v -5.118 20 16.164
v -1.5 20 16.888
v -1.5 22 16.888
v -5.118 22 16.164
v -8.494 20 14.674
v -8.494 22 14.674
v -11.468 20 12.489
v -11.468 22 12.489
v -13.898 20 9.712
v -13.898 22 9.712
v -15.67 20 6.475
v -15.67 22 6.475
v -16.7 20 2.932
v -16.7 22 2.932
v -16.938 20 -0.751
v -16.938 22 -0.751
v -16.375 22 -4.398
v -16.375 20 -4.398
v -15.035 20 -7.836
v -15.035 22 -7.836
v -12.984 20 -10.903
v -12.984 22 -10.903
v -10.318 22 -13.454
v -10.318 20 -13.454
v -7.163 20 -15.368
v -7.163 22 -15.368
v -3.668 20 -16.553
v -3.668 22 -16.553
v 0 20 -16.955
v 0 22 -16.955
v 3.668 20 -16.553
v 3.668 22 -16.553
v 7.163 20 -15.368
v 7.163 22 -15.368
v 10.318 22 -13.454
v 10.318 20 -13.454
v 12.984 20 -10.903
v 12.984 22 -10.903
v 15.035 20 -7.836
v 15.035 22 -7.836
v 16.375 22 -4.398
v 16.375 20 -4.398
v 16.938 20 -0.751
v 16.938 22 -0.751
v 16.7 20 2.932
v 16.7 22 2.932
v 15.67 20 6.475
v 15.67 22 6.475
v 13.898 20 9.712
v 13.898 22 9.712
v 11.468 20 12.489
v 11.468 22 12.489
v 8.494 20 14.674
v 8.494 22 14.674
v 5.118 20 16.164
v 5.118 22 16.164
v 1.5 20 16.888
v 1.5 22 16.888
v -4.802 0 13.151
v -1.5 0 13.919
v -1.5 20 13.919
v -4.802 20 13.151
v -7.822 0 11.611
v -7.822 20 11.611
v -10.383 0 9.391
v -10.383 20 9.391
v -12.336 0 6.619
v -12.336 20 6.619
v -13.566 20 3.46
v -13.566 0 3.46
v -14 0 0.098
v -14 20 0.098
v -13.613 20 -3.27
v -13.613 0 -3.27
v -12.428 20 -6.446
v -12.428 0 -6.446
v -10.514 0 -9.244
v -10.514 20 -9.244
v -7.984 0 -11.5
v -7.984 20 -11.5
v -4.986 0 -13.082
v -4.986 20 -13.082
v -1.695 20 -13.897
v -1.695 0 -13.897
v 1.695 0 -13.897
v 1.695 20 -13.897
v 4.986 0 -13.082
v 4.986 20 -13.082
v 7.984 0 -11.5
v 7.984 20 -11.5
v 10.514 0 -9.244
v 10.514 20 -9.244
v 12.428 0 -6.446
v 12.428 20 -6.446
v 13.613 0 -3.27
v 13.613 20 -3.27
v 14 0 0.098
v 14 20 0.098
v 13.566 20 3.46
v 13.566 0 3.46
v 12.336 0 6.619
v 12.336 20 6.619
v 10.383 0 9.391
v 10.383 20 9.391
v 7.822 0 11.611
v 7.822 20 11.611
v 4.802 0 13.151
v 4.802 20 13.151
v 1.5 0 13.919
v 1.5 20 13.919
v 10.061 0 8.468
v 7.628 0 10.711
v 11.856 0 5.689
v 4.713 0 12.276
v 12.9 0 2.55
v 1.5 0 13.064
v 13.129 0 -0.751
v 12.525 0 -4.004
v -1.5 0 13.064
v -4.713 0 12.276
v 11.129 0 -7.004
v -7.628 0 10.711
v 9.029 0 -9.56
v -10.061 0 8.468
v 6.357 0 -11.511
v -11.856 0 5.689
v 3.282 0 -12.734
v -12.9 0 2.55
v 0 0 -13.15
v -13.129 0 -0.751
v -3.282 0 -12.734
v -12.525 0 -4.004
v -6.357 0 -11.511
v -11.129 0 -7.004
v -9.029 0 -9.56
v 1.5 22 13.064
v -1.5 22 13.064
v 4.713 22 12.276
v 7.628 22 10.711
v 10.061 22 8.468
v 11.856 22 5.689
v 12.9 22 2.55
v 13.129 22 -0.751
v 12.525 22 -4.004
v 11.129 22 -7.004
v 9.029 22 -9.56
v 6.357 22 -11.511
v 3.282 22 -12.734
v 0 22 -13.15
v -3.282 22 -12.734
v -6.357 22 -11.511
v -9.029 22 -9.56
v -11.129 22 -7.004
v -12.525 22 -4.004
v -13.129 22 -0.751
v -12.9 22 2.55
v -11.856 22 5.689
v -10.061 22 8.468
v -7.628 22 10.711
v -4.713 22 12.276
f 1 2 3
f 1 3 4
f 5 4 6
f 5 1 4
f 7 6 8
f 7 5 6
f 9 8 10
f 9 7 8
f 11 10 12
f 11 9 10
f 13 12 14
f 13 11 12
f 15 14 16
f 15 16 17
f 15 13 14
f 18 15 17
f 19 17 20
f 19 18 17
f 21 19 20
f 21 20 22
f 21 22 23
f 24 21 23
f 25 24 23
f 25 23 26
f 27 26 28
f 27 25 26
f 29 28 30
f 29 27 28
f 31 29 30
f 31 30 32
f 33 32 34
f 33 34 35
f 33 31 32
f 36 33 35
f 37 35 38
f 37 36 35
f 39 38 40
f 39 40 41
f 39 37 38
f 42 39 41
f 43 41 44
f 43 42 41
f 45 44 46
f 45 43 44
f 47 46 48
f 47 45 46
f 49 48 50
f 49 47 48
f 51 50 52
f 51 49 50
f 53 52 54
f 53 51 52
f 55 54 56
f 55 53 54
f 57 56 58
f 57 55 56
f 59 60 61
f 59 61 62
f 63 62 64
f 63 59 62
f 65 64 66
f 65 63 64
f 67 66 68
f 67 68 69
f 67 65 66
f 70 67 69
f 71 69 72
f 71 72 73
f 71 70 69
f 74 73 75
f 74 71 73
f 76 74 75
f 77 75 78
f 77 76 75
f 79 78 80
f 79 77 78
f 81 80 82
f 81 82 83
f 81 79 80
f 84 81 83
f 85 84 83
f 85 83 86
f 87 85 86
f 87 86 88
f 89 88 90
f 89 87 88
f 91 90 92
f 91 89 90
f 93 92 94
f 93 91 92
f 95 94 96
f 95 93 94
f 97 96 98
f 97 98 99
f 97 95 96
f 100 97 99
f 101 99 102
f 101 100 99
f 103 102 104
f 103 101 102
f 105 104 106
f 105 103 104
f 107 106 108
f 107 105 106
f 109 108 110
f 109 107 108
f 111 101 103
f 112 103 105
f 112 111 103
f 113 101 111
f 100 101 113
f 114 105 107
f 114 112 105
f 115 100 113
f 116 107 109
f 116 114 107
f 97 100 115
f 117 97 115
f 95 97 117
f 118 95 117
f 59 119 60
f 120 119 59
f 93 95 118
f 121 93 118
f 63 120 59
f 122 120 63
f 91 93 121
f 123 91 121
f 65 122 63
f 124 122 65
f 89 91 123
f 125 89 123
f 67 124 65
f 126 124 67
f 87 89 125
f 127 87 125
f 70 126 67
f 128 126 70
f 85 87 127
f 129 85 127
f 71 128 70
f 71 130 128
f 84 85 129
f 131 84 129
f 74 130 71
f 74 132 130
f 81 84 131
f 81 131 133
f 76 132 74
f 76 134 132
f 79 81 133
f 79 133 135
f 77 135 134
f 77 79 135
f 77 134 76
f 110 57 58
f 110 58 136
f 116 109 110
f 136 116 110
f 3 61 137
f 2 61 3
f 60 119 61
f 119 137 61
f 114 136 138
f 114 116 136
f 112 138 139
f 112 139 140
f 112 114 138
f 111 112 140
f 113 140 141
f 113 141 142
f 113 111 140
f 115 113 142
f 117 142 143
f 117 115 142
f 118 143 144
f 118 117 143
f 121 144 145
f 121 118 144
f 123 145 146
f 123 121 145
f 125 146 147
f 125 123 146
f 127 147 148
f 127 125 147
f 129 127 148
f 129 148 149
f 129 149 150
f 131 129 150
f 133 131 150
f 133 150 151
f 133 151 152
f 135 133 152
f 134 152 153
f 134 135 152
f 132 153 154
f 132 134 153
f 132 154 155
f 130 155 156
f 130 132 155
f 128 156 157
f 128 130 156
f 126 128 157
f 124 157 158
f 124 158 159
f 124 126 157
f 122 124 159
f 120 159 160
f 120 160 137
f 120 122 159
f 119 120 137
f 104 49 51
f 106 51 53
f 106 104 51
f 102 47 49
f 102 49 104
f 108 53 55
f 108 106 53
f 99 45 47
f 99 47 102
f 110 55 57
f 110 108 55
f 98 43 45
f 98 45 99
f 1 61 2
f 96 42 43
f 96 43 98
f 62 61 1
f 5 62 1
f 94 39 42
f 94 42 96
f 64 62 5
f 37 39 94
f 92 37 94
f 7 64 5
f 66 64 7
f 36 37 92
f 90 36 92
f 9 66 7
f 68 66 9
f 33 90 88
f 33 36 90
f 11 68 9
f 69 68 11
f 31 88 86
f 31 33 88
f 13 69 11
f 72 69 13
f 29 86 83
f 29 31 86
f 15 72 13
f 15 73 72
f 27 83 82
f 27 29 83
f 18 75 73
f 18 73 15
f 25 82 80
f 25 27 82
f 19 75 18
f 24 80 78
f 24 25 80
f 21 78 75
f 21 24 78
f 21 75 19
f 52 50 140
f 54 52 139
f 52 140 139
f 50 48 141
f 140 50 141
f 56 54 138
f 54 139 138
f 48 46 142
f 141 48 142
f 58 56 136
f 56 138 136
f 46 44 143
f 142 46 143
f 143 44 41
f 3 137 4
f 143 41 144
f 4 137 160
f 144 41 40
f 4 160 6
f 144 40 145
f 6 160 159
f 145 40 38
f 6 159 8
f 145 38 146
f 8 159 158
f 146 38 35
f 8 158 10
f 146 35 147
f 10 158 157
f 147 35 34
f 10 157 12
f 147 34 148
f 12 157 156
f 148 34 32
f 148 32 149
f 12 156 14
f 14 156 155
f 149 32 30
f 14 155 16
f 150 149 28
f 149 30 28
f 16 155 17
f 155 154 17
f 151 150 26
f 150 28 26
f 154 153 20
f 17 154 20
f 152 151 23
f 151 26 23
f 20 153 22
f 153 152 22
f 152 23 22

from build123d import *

# Parameters (mm, degrees)
BOSS_EXTRUDE1_DEPTH = 20
BOSS_EXTRUDE2_DEPTH = 2


with BuildPart() as part:
    # Sketch1 → Boss-Extrude1 (new body)
    with BuildSketch(Plane(origin=(0, 0, 0), x_dir=(1, 0, 0), z_dir=(0, 1, 0))):
        with BuildLine():
            Line((-1.5, -13.064168554), (-1.5, -13.919410907))
            ThreePointArc((-1.5, -13.919410907), (0, 14), (1.5, -13.919410907))
            Line((1.5, -13.919410907), (1.5, -13.064168554))
            ThreePointArc((1.5, -13.064168554), (0, 13.15), (-1.5, -13.064168554))
        make_face()
    extrude(amount=BOSS_EXTRUDE1_DEPTH)

    # Sketch2 → Boss-Extrude2 (add)
    with BuildSketch(Plane(origin=(0, 20, 0), x_dir=(1, 0, 0), z_dir=(0, 1, 0))):
        with BuildLine():
            Line((-1.5, -13.064168554), (-1.5, -16.888391582))
            ThreePointArc((-1.5, -16.888391582), (0, 16.954874527), (1.5, -16.888391582))
            Line((1.5, -16.888391582), (1.5, -13.064168554))
            ThreePointArc((1.5, -13.064168554), (0, 13.15), (-1.5, -13.064168554))
        make_face()
    extrude(amount=BOSS_EXTRUDE2_DEPTH)


solid = part.part
